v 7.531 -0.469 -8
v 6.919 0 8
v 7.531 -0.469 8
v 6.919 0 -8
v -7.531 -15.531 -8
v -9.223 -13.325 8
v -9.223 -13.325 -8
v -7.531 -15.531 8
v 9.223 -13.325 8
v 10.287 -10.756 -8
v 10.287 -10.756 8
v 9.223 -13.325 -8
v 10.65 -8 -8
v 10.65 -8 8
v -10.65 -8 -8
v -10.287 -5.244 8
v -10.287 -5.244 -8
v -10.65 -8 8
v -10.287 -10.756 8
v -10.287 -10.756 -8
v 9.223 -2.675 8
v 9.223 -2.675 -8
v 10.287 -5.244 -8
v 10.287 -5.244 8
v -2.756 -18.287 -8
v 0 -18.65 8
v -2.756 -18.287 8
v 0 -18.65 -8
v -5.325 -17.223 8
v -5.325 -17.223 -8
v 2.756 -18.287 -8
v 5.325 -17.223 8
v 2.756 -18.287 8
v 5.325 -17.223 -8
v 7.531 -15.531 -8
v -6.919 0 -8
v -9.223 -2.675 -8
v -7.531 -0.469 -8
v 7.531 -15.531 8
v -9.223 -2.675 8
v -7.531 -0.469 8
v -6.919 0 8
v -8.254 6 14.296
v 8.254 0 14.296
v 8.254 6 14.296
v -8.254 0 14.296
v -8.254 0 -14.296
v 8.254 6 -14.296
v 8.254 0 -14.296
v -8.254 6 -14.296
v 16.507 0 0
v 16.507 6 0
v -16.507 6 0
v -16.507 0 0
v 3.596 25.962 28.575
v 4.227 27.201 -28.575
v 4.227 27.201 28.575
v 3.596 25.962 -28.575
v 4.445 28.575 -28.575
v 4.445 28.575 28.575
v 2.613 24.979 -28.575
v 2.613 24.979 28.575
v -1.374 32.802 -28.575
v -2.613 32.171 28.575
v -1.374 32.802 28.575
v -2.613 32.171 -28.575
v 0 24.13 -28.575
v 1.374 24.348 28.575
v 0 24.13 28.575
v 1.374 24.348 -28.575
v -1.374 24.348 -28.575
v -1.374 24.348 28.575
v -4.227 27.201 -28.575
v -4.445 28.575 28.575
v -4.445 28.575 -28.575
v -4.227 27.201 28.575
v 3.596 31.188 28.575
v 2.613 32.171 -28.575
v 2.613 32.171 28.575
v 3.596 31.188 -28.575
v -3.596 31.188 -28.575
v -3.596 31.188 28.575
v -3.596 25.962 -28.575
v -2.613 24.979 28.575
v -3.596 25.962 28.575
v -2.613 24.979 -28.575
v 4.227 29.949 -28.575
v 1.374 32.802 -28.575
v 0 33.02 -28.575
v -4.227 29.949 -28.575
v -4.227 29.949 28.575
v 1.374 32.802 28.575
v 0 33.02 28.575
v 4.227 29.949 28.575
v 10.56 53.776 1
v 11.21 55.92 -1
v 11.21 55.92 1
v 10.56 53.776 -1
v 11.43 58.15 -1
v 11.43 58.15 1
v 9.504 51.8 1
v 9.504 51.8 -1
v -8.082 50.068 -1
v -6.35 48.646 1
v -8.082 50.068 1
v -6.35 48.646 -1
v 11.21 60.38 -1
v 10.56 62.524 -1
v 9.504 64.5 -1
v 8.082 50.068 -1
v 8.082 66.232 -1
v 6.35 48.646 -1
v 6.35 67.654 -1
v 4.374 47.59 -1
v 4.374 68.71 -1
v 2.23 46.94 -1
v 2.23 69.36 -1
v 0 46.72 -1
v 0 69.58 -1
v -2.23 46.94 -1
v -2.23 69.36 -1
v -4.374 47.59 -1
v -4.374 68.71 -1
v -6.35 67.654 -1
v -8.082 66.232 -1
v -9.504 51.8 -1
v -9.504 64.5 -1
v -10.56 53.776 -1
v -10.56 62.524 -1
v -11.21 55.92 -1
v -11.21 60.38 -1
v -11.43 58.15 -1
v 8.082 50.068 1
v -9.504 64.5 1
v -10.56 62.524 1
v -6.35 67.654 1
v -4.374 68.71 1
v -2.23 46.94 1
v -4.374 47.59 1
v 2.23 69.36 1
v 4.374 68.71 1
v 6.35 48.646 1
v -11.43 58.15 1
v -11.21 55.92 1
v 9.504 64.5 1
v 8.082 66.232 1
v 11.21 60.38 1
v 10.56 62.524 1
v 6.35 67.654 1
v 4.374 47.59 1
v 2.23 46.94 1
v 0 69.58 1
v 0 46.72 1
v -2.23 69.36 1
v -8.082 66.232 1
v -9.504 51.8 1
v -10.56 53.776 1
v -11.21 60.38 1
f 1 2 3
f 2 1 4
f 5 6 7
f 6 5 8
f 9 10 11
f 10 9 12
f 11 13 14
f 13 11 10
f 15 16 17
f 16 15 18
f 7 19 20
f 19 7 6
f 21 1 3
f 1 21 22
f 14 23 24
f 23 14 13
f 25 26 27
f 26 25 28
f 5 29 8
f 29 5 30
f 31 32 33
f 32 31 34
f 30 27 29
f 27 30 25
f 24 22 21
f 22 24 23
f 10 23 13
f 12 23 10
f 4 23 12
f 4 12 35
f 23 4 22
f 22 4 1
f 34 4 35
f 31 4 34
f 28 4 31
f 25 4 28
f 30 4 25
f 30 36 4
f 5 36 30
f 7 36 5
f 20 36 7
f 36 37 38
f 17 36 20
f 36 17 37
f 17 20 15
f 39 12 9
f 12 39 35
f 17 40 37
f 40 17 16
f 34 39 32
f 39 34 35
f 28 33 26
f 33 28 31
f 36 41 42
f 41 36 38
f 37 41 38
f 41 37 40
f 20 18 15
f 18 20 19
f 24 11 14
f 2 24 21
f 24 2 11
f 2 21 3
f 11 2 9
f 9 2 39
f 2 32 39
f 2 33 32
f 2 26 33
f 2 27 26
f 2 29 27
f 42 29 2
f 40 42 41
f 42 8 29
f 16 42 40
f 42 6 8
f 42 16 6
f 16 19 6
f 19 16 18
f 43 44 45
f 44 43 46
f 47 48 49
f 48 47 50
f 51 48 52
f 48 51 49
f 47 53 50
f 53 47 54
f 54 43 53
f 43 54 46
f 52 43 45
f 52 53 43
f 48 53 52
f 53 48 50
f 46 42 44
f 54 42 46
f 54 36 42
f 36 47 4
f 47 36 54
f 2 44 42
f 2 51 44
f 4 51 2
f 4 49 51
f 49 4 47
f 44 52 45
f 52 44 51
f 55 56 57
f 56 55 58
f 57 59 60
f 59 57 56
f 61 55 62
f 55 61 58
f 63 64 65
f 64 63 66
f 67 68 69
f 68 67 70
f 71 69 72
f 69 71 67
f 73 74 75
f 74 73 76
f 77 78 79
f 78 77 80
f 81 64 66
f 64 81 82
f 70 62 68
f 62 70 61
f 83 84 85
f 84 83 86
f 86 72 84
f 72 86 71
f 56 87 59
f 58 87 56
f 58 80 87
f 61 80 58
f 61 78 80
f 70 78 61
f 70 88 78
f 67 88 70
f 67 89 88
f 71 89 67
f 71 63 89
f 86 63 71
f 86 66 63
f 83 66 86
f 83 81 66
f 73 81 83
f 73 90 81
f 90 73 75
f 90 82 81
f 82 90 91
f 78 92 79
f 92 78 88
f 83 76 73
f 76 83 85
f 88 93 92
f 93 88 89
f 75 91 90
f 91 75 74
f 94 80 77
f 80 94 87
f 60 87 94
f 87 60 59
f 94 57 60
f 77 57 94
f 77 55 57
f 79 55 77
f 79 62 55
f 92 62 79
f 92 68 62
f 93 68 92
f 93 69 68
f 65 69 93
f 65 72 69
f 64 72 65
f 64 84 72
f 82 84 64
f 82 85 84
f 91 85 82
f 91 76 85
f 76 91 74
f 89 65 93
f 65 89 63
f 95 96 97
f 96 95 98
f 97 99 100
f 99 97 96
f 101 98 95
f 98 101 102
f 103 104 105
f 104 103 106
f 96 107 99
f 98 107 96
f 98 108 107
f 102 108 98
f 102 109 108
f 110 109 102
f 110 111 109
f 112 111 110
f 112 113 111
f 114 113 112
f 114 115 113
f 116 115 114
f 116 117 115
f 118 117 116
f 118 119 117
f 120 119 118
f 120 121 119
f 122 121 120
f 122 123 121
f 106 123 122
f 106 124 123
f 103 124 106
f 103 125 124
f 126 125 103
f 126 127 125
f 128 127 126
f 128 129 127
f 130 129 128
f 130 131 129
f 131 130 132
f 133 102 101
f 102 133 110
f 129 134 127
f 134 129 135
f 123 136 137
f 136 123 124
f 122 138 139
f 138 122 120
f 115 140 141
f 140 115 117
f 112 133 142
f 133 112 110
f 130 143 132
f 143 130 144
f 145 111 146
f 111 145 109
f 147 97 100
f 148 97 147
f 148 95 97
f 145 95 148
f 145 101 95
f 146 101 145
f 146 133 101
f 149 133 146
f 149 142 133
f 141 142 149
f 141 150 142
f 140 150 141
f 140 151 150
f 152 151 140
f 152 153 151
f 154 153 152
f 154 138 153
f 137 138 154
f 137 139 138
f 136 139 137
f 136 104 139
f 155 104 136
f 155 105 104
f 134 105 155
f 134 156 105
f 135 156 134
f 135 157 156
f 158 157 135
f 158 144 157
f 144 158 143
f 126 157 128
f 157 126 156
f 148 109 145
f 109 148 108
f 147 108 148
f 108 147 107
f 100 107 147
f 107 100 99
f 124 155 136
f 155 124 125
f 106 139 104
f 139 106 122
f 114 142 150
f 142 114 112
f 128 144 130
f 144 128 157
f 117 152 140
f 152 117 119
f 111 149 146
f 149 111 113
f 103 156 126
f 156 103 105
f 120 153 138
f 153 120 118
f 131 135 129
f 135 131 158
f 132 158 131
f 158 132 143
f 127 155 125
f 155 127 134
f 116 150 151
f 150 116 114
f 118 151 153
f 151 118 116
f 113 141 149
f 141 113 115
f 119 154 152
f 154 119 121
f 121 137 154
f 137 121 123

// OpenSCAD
// Auto-generated by scripts/author_from_manifest.py (Phase D.3).
// Source: data/phase_d_manifest.json (sku_intent='viking-vk100-upright-286f').
// Do not hand-edit — regenerate from the manifest.
//
// @part viking_vk100_upright_286f
// @kind sprinkler_head
// @category head.upright.k56
// @display-name "Viking VK100 Upright K5.6 SR 286°F"
// @mfg viking_group
// @mfg-pn VK100
// @listing UL FM
// @hazard-classes LH OH1
// @price-usd 12.90
// @install-minutes 8
// @crew journeyman
// @k-factor 5.6
// @orientation upright
// @response standard
// @temperature 286F
// @param size_in number default=0.5 label="Size" unit="in"
// @port inlet position=[0,0.014,0] direction=[0,1,0] style=NPT_threaded size_in=0.5 role=drop

size_in = 0.5;
k_factor = 5.6;

length_mm   = 57.15;
body_dia_mm = 25.40;
thread_od   = 21.3;
thread_len  = 16;
deflector_d = body_dia_mm * 0.9;

rotate([180,0,0]) union() {
    translate([0, thread_len/2, 0])
        cylinder(h = thread_len, d = thread_od, center = true, $fn = 24);
    translate([0, -3, 0])
        rotate([90, 0, 0])
        cylinder(h = 6, d = thread_od * 1.55, $fn = 6, center = true);
    translate([0, -length_mm/2, 0])
        cylinder(h = length_mm, d = body_dia_mm * 0.35, center = true, $fn = 20);
    translate([0, -length_mm - 1, 0])
        cylinder(h = 2, d = deflector_d, center = true, $fn = 32);
}
